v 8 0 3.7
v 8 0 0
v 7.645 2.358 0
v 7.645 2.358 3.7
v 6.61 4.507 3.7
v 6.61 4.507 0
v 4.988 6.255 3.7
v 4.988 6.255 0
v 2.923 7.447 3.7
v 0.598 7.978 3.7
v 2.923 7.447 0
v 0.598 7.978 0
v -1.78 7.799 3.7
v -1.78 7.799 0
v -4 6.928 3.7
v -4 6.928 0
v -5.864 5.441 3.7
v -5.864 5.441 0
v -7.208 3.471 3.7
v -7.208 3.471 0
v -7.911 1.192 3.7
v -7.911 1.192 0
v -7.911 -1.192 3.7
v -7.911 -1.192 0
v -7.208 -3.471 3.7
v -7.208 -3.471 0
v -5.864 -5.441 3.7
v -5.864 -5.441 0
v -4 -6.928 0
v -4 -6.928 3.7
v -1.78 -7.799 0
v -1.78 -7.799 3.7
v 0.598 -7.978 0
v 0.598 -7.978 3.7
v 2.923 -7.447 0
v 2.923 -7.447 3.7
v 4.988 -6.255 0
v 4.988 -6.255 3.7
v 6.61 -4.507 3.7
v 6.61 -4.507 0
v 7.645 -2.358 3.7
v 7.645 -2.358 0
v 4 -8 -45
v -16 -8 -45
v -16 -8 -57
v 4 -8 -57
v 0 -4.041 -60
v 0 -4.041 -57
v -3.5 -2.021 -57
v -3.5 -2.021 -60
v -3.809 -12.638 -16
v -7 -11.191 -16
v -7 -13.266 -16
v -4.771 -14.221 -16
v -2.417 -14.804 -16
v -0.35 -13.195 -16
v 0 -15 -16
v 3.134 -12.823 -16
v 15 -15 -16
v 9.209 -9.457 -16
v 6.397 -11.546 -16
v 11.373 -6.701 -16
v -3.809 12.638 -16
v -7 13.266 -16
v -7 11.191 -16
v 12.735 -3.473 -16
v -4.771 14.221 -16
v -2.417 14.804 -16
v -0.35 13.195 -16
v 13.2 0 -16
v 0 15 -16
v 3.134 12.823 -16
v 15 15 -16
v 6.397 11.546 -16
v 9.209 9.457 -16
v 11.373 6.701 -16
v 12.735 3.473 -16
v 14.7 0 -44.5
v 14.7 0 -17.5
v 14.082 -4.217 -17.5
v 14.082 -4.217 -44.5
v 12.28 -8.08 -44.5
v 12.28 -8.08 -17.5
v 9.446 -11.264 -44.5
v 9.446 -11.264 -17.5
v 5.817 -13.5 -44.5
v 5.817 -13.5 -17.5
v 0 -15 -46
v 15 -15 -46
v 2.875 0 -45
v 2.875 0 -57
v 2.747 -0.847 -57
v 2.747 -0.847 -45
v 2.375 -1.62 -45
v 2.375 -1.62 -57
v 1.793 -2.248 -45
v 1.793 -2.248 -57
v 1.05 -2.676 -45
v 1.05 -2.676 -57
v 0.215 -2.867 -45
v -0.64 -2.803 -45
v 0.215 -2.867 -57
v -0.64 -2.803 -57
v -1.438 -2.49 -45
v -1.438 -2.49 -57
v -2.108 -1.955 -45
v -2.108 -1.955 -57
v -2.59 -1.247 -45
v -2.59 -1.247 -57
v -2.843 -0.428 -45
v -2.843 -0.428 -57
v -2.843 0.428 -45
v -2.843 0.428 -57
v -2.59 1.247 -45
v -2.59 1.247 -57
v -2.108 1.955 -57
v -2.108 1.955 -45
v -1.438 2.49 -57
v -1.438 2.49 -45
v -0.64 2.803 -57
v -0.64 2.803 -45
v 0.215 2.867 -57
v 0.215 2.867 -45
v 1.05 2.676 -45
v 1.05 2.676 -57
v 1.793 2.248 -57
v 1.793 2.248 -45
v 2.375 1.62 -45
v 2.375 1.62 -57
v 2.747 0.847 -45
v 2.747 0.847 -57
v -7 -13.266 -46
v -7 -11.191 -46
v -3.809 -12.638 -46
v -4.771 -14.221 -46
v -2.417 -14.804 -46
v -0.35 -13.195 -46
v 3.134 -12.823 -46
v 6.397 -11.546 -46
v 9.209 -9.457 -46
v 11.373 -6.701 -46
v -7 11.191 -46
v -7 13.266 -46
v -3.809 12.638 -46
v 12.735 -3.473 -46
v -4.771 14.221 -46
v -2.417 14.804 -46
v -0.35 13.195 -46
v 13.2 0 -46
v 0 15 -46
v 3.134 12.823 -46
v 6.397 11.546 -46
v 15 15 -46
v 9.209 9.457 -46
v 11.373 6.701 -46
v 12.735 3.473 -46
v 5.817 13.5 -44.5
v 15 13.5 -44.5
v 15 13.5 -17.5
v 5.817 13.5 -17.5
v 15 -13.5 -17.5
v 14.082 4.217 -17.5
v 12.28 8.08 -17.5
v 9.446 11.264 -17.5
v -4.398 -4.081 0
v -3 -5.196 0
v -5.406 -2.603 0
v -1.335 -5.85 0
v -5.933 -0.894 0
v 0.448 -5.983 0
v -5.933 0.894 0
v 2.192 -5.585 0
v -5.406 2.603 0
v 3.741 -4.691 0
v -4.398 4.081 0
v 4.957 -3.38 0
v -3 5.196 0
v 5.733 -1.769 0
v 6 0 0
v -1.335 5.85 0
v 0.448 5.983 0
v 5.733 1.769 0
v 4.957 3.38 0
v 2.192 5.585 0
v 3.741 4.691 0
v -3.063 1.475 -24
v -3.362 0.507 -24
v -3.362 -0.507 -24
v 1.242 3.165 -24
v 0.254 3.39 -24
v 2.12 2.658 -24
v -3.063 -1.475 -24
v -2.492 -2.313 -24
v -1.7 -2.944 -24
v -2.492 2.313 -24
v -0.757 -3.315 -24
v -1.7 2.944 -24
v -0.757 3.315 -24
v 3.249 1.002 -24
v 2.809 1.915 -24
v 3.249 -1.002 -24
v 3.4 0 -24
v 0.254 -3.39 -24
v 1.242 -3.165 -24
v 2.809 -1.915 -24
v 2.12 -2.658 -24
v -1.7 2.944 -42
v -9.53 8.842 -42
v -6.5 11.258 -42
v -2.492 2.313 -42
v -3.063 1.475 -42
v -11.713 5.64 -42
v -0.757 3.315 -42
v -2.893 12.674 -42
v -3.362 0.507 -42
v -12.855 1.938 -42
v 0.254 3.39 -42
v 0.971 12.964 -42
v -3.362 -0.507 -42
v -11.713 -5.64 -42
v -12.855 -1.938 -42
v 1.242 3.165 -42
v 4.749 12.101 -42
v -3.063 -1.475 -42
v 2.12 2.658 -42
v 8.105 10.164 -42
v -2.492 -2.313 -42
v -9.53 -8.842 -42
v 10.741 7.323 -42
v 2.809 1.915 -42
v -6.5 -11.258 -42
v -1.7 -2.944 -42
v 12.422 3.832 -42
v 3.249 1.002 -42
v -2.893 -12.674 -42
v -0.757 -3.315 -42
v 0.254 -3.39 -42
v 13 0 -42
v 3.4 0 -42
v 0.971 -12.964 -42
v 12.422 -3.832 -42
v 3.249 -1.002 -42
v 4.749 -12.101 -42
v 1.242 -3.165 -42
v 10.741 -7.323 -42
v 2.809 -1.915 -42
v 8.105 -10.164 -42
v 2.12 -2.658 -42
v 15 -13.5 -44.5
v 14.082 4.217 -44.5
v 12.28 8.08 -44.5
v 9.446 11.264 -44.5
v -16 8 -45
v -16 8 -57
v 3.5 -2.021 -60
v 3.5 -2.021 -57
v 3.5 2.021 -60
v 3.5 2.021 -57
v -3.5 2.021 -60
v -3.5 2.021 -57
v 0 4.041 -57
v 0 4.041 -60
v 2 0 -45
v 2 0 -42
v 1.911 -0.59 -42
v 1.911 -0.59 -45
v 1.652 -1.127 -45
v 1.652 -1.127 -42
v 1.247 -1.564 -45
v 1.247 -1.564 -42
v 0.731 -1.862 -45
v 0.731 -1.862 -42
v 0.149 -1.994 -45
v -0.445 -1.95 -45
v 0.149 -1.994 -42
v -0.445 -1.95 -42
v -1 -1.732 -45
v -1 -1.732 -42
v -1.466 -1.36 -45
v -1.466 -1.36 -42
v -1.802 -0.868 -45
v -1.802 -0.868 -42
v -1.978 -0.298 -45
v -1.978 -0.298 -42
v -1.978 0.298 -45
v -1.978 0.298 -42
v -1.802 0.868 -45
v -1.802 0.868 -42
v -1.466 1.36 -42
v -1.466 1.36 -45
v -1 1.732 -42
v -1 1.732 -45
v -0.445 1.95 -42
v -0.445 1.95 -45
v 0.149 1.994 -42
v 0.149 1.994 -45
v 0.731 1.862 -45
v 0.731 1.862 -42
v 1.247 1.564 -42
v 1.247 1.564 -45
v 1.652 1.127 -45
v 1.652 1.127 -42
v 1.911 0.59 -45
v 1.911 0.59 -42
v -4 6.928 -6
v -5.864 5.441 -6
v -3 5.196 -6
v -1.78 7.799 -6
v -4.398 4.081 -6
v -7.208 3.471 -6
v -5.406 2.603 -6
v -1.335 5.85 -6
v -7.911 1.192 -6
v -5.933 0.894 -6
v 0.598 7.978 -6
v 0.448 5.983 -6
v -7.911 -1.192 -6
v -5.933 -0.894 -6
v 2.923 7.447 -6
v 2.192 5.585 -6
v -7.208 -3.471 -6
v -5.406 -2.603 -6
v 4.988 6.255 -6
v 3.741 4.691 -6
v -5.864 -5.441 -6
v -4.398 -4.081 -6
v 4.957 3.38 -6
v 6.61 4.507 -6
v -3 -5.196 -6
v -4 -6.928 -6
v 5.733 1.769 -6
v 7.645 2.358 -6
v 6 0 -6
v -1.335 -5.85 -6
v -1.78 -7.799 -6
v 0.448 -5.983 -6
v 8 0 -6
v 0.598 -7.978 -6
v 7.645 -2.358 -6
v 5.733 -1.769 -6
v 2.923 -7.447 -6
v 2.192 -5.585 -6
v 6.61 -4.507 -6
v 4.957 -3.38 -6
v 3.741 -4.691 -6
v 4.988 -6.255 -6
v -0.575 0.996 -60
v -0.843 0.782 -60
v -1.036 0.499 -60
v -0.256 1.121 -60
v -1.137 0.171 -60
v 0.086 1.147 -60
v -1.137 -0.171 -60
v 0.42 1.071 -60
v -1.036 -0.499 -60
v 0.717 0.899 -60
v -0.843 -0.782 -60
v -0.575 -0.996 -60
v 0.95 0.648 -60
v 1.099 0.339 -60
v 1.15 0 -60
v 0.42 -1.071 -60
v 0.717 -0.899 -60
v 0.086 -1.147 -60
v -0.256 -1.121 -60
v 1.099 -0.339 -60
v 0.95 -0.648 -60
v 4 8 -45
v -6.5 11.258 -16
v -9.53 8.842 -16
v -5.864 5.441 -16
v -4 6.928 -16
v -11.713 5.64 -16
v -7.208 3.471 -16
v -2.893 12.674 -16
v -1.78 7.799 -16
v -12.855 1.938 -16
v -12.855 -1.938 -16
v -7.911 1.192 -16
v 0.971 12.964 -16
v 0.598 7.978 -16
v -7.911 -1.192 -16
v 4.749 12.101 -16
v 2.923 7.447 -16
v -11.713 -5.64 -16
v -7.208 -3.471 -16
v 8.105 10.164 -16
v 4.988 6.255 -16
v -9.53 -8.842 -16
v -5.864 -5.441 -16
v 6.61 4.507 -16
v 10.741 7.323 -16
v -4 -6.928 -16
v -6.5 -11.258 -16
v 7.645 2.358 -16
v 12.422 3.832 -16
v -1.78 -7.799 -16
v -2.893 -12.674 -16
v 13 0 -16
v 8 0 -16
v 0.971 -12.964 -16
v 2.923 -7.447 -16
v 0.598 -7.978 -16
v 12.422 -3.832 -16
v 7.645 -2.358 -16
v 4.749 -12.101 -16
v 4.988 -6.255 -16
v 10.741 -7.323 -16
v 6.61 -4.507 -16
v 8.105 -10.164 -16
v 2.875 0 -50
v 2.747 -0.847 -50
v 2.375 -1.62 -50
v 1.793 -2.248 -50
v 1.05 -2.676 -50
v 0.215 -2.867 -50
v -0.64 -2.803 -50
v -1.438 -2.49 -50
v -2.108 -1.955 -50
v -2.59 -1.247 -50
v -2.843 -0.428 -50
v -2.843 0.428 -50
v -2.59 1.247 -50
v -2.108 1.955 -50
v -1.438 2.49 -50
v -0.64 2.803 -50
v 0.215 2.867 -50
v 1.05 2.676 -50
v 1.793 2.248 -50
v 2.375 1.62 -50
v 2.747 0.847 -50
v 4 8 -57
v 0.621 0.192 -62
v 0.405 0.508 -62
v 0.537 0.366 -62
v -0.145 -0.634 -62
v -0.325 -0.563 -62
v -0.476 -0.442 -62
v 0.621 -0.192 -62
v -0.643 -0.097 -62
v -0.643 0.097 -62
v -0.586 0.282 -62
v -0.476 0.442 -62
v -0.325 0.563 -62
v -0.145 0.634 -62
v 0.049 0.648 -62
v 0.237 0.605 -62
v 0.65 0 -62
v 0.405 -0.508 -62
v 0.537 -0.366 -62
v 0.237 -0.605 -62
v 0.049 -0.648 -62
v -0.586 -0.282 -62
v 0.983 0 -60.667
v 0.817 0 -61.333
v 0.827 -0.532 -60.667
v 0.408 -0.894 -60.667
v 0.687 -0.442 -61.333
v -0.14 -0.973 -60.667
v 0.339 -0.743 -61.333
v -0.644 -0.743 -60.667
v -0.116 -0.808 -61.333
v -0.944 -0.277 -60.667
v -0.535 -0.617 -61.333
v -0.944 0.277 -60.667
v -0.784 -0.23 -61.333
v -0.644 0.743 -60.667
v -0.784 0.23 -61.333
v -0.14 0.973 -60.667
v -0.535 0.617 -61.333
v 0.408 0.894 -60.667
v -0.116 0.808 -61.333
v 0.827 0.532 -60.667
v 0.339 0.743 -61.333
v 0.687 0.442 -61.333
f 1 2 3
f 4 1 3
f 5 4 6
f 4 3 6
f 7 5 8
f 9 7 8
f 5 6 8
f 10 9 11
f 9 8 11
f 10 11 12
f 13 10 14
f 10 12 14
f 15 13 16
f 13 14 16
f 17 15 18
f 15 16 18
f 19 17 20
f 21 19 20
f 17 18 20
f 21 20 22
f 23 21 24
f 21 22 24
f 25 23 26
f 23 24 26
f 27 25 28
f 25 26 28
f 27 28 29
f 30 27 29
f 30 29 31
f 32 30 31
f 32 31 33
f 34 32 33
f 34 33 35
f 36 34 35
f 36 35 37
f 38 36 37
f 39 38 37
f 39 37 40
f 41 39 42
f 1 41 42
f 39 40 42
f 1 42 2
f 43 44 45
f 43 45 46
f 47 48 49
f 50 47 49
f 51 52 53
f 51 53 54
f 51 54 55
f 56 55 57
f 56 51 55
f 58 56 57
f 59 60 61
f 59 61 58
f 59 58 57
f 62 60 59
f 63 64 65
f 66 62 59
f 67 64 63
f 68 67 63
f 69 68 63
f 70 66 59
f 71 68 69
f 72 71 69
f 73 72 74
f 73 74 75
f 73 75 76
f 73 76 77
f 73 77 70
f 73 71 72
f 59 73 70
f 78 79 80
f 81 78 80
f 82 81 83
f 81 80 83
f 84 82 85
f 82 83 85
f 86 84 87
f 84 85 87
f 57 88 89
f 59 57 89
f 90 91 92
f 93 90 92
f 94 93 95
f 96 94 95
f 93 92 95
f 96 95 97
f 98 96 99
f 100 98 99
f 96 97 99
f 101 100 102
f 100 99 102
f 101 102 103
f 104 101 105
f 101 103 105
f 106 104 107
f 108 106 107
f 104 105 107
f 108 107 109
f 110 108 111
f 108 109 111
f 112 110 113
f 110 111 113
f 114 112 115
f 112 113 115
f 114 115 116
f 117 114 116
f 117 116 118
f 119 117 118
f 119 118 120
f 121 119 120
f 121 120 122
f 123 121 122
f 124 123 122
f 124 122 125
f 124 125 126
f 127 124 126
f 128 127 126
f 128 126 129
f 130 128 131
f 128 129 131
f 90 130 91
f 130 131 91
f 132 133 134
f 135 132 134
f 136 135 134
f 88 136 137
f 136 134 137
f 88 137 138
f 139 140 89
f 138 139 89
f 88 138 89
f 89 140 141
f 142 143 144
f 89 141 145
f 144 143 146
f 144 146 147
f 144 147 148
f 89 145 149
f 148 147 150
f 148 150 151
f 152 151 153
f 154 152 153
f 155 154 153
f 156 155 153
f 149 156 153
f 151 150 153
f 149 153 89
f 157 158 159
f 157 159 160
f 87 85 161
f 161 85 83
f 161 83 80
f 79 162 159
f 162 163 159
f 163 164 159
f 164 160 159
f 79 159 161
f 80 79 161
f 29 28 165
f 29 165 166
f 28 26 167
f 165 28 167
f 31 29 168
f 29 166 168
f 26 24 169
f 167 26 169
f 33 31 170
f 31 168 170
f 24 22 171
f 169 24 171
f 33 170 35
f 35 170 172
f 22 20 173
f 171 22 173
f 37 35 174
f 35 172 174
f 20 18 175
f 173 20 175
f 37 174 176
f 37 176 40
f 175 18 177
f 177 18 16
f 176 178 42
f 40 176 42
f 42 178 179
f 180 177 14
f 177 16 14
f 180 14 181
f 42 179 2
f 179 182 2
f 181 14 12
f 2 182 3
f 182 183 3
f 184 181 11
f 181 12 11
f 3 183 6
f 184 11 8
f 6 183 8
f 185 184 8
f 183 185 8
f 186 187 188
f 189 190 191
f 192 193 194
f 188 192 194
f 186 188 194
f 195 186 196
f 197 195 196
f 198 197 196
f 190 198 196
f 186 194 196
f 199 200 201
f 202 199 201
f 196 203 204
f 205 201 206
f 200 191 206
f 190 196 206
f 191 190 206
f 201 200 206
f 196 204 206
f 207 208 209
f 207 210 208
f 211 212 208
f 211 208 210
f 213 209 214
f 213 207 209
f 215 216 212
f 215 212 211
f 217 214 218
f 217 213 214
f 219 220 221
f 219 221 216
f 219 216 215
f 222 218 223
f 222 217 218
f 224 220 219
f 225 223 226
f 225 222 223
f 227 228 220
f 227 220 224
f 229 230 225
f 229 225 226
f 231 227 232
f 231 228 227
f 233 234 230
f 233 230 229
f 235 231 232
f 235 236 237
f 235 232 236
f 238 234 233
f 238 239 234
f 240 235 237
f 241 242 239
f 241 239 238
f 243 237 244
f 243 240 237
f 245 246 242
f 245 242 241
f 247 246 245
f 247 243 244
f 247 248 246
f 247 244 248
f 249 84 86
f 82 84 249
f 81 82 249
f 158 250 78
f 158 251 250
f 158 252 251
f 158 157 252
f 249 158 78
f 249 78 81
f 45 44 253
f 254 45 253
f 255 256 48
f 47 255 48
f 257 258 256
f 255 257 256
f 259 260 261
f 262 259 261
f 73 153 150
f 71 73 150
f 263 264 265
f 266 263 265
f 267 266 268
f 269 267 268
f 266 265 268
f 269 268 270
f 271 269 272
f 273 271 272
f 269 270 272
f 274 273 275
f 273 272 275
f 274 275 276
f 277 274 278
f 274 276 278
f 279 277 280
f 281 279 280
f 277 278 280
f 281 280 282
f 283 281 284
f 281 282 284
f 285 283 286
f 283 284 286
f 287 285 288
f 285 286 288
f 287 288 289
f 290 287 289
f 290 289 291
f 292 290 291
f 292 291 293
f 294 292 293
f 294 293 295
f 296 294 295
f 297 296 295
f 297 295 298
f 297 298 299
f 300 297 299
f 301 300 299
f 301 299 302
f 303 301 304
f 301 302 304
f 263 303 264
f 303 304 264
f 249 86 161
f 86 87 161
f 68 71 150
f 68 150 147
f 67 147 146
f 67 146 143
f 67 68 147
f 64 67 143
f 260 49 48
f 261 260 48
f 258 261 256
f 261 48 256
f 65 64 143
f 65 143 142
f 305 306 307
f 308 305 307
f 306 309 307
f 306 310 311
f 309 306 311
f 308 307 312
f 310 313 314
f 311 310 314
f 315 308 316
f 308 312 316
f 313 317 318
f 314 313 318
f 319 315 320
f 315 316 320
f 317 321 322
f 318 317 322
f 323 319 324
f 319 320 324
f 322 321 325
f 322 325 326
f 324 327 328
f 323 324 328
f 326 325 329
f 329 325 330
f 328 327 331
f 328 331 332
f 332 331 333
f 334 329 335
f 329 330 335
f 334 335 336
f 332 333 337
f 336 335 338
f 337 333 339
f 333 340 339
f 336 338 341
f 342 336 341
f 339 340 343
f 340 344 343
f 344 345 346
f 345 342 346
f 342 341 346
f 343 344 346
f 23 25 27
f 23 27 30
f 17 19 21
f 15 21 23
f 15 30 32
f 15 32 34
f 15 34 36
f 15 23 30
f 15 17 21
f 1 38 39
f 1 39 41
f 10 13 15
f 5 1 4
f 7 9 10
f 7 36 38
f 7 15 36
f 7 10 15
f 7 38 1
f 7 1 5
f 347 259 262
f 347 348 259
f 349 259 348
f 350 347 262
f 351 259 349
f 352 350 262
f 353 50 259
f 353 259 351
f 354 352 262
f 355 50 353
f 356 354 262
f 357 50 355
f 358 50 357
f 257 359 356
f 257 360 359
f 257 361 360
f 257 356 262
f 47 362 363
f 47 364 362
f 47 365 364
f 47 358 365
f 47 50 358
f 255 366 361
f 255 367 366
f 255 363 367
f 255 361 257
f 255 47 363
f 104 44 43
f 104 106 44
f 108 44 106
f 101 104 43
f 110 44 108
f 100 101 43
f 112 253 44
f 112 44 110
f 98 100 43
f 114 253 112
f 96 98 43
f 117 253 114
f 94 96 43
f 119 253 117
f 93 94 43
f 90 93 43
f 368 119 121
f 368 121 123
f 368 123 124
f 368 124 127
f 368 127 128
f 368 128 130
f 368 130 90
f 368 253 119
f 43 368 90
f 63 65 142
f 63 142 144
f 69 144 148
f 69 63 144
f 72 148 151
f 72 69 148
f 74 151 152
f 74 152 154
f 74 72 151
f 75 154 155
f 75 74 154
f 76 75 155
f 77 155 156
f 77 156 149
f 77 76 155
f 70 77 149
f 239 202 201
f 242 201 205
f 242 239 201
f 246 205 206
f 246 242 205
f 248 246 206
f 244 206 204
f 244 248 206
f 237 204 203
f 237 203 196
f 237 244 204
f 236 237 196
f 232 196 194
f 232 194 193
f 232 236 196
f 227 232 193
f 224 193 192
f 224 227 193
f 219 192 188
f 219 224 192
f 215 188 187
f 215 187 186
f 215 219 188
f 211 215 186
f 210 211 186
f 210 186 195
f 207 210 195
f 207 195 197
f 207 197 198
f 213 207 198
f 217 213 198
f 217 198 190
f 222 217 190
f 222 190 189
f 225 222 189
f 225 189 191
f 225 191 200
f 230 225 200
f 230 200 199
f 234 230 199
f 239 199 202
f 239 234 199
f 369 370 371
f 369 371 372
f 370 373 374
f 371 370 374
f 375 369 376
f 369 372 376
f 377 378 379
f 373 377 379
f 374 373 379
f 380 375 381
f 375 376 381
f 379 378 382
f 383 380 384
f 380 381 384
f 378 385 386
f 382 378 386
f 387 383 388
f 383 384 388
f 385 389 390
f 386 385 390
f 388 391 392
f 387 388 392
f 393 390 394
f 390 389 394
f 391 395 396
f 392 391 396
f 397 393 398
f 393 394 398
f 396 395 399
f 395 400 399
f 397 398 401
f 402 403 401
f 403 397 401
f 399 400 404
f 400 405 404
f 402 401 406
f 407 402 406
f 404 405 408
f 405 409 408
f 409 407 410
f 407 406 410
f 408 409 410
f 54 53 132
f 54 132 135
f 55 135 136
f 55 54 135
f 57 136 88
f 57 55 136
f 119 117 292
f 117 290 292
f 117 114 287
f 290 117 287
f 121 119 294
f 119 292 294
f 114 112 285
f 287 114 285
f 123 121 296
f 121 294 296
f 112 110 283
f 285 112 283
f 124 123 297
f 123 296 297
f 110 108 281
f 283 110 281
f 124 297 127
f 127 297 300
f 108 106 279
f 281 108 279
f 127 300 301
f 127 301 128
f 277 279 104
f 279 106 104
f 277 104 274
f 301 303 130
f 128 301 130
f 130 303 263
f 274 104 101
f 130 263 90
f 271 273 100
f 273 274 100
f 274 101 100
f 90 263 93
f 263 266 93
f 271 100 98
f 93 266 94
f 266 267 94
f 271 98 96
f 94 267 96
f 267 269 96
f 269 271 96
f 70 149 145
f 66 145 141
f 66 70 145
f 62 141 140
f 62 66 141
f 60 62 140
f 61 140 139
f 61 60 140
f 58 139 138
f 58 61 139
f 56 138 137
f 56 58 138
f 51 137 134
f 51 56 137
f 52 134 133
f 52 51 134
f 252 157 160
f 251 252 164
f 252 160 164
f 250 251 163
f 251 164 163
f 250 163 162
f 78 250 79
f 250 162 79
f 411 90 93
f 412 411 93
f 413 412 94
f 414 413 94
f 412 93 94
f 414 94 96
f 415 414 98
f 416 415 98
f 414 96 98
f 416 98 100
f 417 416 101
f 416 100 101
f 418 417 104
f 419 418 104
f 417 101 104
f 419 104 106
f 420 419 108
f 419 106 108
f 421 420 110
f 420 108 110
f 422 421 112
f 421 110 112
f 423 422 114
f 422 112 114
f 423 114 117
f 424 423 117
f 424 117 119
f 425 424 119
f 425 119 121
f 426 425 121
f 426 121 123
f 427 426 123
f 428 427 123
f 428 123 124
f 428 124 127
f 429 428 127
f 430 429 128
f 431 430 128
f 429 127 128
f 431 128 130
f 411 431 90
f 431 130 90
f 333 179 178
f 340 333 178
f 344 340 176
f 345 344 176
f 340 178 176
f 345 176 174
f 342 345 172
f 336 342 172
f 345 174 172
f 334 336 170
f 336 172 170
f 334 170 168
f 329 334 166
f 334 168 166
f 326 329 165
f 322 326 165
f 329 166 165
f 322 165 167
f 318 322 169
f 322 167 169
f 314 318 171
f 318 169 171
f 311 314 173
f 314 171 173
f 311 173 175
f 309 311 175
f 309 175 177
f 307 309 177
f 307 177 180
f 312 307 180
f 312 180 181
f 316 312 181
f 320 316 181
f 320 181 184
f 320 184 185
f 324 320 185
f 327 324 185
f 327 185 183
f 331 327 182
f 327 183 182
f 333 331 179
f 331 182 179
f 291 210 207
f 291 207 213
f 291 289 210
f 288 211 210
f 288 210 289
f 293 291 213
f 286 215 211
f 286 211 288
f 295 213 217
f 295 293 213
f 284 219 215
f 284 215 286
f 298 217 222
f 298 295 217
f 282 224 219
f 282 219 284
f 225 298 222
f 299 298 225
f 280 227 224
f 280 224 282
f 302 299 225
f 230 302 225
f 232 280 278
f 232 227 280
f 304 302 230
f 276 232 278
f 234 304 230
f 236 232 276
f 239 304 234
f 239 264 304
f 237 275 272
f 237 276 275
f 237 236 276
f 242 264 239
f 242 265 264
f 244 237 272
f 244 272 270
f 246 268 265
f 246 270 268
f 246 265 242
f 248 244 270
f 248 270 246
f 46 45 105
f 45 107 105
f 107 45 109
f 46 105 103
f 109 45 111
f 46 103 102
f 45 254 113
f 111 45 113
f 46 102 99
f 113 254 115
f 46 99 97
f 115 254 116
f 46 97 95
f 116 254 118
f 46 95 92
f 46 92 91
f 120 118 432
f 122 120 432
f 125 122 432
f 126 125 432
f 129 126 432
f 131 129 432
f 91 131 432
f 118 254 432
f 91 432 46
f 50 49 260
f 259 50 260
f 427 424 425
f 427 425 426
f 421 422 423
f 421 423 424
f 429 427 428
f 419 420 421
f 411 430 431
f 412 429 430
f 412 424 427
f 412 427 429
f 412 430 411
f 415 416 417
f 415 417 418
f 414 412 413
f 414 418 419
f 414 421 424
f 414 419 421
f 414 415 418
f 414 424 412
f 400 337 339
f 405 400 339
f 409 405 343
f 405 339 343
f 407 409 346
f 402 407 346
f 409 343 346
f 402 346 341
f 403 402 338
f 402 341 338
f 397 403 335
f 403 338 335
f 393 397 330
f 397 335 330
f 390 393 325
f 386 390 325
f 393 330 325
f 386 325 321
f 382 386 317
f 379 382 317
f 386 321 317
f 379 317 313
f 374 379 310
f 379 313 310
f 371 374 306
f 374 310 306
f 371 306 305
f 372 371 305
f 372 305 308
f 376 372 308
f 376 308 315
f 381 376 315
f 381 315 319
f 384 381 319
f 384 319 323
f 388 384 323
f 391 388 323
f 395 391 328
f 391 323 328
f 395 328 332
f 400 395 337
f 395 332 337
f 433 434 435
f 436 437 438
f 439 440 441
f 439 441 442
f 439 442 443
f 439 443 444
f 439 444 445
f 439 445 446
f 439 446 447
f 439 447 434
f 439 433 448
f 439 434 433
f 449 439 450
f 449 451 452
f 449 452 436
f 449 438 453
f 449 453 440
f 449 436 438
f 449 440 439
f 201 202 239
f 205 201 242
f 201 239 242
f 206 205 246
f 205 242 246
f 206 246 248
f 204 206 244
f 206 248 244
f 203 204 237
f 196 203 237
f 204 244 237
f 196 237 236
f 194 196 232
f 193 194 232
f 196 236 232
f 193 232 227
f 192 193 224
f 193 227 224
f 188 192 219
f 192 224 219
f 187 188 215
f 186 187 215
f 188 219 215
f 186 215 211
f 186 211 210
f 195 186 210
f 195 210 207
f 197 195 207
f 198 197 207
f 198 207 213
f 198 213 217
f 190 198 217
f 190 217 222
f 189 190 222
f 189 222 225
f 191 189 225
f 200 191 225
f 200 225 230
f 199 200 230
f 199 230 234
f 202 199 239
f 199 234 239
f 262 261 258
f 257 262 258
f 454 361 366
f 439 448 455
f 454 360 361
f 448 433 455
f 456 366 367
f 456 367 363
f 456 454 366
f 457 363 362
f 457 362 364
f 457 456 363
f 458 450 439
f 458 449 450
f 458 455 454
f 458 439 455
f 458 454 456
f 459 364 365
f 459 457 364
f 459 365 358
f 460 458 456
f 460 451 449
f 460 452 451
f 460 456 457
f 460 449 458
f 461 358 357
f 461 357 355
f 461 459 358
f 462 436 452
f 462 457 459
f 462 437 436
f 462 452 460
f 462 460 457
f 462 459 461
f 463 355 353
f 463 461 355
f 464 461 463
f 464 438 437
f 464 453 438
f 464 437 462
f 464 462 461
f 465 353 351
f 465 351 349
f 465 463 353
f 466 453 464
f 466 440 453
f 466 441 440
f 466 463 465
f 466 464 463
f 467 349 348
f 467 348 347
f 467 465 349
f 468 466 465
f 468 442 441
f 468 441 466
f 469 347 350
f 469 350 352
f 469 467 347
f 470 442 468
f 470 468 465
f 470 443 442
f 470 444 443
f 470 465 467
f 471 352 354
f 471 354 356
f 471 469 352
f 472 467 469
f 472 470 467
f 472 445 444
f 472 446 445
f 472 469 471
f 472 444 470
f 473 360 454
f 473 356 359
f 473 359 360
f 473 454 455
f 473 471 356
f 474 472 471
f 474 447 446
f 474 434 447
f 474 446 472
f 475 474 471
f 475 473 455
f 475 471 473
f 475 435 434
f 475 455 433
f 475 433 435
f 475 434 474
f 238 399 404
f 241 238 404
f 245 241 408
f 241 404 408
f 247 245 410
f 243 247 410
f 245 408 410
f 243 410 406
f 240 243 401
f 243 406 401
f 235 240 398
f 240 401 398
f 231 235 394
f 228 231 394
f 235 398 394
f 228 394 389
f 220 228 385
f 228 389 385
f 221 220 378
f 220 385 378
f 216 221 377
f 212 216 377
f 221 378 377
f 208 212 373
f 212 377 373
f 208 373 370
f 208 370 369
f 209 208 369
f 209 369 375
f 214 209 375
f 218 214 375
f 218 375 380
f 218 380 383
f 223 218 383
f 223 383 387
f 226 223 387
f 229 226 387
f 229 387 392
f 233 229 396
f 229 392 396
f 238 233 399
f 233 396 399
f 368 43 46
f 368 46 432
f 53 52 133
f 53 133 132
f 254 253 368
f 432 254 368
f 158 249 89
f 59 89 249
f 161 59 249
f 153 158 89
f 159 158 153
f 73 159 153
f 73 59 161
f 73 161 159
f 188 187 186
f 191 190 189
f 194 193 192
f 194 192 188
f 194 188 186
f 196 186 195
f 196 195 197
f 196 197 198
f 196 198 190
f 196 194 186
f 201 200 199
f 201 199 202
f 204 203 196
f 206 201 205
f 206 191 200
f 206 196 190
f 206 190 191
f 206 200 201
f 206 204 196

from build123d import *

# Parameters (mm, degrees)
F0_R      = 8
F1_DEPTH  = 3.7
F2_R      = 6
F3_DEPTH  = 6
F4_R      = 8
F5_DEPTH  = 10
F6_R      = 13
F7_DEPTH  = 26
F8_R      = 3.4
F9_DEPTH  = 18
F10_R     = 3.4
F11_DEPTH = 18
F12_R     = 2
F13_DEPTH = 3
F14_R     = 2.875
F15_DEPTH = 5
F16_W     = 20
F16_H     = 16
F17_DEPTH = 12
F18_R     = 2.875
F19_DEPTH = 12
F21_DEPTH = 3
F22_R     = 1.9
F24_R     = 0.65
F27_DEPTH = 30
F28_T     = -1.5


with BuildPart() as f1:
    # F0 (on Top) → F1 (new body)
    with BuildSketch(Plane.XY):
        Circle(F0_R)
    extrude(amount=F1_DEPTH)

    # F2 (on face) → F3 (join)
    with BuildSketch(Plane(origin=(0, 0, 0), x_dir=(1, 0, 0), z_dir=(0, 0, -1))):
        Circle(F2_R)
    extrude(amount=F3_DEPTH)

    # F4 (on face) → F5 (join)
    with BuildSketch(Plane(origin=(0, 0, -6), x_dir=(1, 0, 0), z_dir=(0, 0, -1))):
        Circle(F4_R)
    extrude(amount=F5_DEPTH)

    # F6 (on face) → F7 (join)
    with BuildSketch(Plane(origin=(0, 0, -16), x_dir=(1, 0, 0), z_dir=(0, 0, -1))):
        Circle(F6_R)
    extrude(amount=F7_DEPTH)

    # F8 (on face) → F9 (cut)
    with BuildSketch(Plane(origin=(0, 0, -42), x_dir=(1, 0, 0), z_dir=(0, 0, -1))):
        Circle(F8_R)
    extrude(amount=-F9_DEPTH, mode=Mode.SUBTRACT)


with BuildPart() as f11:
    # F10 (on face) → F11 (new body)
    with BuildSketch(Plane(origin=(0, 0, -42), x_dir=(1, 0, 0), z_dir=(0, 0, -1))):
        Circle(F10_R)
    extrude(amount=-F11_DEPTH)

    # F12 (on face) → F13 (join)
    with BuildSketch(Plane(origin=(0, 0, -42), x_dir=(1, 0, 0), z_dir=(0, 0, -1))):
        Circle(F12_R)
    extrude(amount=F13_DEPTH)

    # F14 (on face) → F15 (join)
    with BuildSketch(Plane(origin=(0, 0, -45), x_dir=(1, 0, 0), z_dir=(0, 0, -1))):
        Circle(F14_R)
    extrude(amount=F15_DEPTH)


with BuildPart() as f17:
    # F16 (on face) → F17 (new body)
    with BuildSketch(Plane.XY.offset(-45)):
        with Locations((-6, 0)):
            Rectangle(F16_W, F16_H)
    extrude(amount=-F17_DEPTH)

    # F18 (on face) → F19 (cut, through all)
    with BuildSketch(Plane(origin=(0, 0, -57), x_dir=(1, 0, 0), z_dir=(0, 0, -1))):
        Circle(F18_R)
    extrude(amount=-F19_DEPTH, mode=Mode.SUBTRACT)


with BuildPart() as f21:
    # F20 (on face) → F21 (new body)
    with BuildSketch(Plane(origin=(0, 0, -57), x_dir=(1, 0, 0), z_dir=(0, 0, -1))):
        Polygon((-3.5, 2.0207259422), (-3.5, -2.0207259422), (0, -4.0414518843), (3.5, -2.0207259422), (3.5, 2.0207259422), (0, 4.0414518843), align=None)
    extrude(amount=F21_DEPTH)

    # F22 (on face) → F25 section 0
    with BuildSketch(Plane(origin=(0, 0, -57), x_dir=(1, 0, 0), z_dir=(0, 0, -1))):
        Circle(F22_R)
    # F24 (on offset) → F25 section 1
    with BuildSketch(Plane(origin=(0, 0, -62), x_dir=(1, 0, 0), z_dir=(0, 0, -1))):
        Circle(F24_R)
    loft()


with BuildPart() as f27:
    # F26 (on face) → F27 (new body)
    with BuildSketch(Plane.XY.offset(-16)):
        with BuildLine():
            Line((-7, -11.1910678668), (-7, -13.2664991614))
            ThreePointArc((-7, -13.2664991614), (-3.6057254872, -14.5601766373), (0, -15))
            Line((0, -15), (15, -15))
            Line((15, -15), (15, 15))
            Line((15, 15), (0, 15))
            ThreePointArc((0, 15), (-3.6057254872, 14.5601766373), (-7, 13.2664991614))
            Line((-7, 13.2664991614), (-7, 11.1910678668))
            ThreePointArc((-7, 11.1910678668), (6.3968742367, 11.5464280191), (13.2, 0))
            ThreePointArc((13.2, 0), (6.3968742367, -11.5464280191), (-7, -11.1910678668))
        make_face()
    extrude(amount=-F27_DEPTH)

    # F28
    f28_openings = [f27.faces().sort_by_distance(p)[0] for p in [
        (15, 0, -31),
    ]]
    offset(amount=F28_T, openings=f28_openings)


solid = Compound([f1.part, f11.part, f17.part, f21.part, f27.part])
